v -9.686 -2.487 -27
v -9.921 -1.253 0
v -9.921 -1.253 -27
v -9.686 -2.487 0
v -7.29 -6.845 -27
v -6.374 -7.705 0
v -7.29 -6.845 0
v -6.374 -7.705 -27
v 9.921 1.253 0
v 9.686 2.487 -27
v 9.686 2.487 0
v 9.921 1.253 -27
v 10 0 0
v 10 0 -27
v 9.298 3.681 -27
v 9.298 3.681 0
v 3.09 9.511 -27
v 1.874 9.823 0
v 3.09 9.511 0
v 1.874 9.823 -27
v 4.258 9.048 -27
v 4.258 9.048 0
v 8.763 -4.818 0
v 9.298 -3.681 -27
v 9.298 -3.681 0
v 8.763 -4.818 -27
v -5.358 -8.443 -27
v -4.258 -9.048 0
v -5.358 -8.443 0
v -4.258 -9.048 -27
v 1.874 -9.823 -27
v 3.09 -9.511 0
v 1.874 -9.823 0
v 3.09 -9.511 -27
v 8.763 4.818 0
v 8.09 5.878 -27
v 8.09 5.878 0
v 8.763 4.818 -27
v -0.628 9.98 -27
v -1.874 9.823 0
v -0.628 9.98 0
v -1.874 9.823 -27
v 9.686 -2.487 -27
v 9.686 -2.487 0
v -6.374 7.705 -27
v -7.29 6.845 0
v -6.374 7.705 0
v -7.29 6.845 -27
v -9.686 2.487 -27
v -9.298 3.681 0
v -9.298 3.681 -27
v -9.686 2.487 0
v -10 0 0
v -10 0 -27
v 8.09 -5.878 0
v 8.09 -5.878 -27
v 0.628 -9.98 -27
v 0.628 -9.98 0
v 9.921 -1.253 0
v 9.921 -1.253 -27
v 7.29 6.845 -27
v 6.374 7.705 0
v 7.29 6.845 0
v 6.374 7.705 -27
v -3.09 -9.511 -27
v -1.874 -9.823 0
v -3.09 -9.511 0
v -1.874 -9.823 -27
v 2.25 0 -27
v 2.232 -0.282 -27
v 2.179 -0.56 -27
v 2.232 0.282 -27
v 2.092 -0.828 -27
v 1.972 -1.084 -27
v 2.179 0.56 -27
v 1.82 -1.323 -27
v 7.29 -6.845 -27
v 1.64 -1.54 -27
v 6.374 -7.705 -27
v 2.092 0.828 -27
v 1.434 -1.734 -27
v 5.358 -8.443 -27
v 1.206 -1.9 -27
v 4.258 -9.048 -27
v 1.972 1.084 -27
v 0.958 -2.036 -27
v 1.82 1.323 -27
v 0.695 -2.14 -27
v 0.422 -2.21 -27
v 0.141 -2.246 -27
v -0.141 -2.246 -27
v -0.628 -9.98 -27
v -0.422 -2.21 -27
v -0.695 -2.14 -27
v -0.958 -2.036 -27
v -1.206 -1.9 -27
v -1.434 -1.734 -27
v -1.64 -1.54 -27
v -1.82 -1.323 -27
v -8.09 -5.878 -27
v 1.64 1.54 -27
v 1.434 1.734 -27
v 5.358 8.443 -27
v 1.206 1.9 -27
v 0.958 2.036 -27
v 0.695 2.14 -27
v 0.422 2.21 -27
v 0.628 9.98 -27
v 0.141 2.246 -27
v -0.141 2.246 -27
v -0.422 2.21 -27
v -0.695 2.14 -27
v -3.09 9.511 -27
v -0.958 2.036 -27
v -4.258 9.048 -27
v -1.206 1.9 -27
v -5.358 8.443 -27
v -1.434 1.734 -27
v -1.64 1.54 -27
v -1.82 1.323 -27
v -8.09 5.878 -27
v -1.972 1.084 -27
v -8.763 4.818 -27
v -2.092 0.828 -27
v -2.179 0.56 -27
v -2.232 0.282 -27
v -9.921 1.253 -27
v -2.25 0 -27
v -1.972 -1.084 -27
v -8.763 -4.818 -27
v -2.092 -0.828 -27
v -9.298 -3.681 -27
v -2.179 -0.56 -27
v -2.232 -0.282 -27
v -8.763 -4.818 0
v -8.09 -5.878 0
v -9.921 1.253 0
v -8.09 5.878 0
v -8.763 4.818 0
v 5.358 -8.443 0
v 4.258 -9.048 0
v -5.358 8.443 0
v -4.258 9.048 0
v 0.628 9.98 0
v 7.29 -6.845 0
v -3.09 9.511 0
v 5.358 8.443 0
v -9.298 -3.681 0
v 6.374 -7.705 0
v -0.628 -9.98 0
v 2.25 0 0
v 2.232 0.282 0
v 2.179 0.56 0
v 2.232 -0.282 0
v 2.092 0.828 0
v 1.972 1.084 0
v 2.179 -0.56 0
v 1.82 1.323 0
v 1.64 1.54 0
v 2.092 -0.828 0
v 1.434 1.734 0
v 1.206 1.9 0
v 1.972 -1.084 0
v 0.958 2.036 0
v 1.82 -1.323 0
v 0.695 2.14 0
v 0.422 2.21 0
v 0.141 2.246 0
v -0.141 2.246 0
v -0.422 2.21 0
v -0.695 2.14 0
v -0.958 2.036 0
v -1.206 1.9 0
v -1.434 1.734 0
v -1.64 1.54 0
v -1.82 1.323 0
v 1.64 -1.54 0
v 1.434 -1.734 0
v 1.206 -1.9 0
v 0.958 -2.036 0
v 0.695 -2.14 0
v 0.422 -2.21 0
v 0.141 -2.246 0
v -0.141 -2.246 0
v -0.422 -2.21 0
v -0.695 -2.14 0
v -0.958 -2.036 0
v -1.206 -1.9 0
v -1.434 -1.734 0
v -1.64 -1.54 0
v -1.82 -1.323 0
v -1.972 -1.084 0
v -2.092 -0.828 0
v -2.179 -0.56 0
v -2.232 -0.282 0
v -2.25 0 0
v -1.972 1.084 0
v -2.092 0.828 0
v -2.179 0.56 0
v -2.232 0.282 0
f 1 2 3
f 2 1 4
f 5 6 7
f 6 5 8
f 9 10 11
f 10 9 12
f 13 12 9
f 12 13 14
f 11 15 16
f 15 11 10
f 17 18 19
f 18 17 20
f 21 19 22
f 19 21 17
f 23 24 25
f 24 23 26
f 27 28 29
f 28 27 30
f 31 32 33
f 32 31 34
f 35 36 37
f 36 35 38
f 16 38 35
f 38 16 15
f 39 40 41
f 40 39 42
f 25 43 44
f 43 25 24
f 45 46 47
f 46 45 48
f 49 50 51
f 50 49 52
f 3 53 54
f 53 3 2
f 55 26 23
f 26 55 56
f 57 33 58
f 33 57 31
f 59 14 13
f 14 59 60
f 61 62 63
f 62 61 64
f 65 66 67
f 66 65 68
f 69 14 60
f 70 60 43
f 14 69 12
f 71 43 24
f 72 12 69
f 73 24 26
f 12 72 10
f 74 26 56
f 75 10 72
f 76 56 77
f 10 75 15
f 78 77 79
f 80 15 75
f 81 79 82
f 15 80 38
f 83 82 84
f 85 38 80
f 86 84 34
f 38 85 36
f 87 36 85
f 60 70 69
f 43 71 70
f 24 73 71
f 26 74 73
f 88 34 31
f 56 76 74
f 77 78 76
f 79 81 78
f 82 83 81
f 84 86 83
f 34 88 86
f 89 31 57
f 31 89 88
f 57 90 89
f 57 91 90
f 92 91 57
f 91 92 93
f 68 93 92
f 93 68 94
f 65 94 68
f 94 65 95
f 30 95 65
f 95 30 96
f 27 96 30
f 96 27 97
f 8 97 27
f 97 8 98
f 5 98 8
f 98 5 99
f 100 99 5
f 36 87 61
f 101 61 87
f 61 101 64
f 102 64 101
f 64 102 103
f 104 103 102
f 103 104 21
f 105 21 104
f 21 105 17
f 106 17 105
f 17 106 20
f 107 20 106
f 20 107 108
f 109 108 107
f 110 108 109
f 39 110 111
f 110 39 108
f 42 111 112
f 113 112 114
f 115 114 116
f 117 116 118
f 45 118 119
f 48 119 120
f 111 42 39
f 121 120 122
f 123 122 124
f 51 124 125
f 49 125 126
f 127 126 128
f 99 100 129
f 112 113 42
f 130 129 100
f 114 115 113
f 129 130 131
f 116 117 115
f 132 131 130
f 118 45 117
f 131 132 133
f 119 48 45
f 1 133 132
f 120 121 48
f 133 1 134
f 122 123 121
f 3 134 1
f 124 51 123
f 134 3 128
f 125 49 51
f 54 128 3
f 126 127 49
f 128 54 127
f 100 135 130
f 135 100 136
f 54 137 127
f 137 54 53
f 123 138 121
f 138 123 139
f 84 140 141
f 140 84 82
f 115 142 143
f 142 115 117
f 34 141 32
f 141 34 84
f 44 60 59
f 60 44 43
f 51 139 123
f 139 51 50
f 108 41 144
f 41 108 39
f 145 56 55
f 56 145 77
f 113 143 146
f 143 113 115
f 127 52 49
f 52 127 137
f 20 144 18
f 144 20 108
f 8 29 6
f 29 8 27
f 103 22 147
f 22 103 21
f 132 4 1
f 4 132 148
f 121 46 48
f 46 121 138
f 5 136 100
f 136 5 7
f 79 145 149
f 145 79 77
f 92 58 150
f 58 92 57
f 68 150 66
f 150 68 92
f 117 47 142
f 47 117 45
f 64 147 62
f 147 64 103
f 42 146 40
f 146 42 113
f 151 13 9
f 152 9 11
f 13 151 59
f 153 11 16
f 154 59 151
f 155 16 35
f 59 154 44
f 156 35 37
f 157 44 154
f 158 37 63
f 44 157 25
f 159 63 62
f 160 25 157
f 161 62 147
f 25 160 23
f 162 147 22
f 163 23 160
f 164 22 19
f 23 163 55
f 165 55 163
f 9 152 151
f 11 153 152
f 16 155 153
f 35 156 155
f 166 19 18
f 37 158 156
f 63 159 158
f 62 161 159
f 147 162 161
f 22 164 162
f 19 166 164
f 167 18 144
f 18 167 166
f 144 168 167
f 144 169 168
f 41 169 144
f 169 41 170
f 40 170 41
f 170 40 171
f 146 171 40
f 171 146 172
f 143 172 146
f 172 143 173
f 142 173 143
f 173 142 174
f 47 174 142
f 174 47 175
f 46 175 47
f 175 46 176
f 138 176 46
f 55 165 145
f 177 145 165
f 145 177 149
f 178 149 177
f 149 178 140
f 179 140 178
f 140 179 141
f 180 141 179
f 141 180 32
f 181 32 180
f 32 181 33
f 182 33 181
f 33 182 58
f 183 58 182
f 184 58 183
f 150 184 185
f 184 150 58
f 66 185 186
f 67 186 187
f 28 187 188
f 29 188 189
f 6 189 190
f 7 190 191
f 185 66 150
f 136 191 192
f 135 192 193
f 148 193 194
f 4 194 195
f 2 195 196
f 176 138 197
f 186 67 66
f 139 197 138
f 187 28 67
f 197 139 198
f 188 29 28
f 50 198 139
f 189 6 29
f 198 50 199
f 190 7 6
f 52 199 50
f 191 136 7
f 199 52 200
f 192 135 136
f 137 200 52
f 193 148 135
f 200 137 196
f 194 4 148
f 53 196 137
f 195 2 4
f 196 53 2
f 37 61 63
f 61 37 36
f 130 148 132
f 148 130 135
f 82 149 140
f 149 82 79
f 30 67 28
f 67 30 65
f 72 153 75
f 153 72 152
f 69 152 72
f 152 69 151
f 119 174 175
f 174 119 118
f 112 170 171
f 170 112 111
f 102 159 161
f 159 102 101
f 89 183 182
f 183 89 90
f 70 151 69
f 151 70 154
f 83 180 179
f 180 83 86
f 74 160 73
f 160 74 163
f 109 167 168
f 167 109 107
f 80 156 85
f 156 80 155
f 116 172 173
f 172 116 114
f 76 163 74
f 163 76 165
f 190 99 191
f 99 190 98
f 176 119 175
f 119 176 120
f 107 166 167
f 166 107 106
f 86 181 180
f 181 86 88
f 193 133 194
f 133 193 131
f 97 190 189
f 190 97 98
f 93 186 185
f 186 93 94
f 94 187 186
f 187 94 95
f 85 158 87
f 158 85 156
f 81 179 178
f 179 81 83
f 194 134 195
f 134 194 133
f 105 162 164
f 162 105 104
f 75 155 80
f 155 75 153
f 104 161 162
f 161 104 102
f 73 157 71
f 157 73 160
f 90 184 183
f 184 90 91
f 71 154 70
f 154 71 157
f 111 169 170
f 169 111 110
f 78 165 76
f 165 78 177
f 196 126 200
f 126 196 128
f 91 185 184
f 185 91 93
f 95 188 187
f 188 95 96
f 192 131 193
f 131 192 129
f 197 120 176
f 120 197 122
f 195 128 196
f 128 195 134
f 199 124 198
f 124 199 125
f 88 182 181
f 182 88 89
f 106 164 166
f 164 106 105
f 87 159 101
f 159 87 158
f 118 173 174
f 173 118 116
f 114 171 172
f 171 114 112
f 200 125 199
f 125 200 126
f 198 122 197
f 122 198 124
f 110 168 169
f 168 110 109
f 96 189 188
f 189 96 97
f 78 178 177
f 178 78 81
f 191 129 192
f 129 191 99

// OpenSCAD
$fn = 50;


difference() {
	union() {
		translate(v = [0, 0, -27.0000000000]) {
			cylinder(h = 27, r = 10.0000000000);
		}
		cylinder(h = 0, r = 19.0000000000);
	}
	union() {
		#translate(v = [0, 0, -27]) {
			cylinder(h = 27, r = 2.2500000000);
		}
	}
}
